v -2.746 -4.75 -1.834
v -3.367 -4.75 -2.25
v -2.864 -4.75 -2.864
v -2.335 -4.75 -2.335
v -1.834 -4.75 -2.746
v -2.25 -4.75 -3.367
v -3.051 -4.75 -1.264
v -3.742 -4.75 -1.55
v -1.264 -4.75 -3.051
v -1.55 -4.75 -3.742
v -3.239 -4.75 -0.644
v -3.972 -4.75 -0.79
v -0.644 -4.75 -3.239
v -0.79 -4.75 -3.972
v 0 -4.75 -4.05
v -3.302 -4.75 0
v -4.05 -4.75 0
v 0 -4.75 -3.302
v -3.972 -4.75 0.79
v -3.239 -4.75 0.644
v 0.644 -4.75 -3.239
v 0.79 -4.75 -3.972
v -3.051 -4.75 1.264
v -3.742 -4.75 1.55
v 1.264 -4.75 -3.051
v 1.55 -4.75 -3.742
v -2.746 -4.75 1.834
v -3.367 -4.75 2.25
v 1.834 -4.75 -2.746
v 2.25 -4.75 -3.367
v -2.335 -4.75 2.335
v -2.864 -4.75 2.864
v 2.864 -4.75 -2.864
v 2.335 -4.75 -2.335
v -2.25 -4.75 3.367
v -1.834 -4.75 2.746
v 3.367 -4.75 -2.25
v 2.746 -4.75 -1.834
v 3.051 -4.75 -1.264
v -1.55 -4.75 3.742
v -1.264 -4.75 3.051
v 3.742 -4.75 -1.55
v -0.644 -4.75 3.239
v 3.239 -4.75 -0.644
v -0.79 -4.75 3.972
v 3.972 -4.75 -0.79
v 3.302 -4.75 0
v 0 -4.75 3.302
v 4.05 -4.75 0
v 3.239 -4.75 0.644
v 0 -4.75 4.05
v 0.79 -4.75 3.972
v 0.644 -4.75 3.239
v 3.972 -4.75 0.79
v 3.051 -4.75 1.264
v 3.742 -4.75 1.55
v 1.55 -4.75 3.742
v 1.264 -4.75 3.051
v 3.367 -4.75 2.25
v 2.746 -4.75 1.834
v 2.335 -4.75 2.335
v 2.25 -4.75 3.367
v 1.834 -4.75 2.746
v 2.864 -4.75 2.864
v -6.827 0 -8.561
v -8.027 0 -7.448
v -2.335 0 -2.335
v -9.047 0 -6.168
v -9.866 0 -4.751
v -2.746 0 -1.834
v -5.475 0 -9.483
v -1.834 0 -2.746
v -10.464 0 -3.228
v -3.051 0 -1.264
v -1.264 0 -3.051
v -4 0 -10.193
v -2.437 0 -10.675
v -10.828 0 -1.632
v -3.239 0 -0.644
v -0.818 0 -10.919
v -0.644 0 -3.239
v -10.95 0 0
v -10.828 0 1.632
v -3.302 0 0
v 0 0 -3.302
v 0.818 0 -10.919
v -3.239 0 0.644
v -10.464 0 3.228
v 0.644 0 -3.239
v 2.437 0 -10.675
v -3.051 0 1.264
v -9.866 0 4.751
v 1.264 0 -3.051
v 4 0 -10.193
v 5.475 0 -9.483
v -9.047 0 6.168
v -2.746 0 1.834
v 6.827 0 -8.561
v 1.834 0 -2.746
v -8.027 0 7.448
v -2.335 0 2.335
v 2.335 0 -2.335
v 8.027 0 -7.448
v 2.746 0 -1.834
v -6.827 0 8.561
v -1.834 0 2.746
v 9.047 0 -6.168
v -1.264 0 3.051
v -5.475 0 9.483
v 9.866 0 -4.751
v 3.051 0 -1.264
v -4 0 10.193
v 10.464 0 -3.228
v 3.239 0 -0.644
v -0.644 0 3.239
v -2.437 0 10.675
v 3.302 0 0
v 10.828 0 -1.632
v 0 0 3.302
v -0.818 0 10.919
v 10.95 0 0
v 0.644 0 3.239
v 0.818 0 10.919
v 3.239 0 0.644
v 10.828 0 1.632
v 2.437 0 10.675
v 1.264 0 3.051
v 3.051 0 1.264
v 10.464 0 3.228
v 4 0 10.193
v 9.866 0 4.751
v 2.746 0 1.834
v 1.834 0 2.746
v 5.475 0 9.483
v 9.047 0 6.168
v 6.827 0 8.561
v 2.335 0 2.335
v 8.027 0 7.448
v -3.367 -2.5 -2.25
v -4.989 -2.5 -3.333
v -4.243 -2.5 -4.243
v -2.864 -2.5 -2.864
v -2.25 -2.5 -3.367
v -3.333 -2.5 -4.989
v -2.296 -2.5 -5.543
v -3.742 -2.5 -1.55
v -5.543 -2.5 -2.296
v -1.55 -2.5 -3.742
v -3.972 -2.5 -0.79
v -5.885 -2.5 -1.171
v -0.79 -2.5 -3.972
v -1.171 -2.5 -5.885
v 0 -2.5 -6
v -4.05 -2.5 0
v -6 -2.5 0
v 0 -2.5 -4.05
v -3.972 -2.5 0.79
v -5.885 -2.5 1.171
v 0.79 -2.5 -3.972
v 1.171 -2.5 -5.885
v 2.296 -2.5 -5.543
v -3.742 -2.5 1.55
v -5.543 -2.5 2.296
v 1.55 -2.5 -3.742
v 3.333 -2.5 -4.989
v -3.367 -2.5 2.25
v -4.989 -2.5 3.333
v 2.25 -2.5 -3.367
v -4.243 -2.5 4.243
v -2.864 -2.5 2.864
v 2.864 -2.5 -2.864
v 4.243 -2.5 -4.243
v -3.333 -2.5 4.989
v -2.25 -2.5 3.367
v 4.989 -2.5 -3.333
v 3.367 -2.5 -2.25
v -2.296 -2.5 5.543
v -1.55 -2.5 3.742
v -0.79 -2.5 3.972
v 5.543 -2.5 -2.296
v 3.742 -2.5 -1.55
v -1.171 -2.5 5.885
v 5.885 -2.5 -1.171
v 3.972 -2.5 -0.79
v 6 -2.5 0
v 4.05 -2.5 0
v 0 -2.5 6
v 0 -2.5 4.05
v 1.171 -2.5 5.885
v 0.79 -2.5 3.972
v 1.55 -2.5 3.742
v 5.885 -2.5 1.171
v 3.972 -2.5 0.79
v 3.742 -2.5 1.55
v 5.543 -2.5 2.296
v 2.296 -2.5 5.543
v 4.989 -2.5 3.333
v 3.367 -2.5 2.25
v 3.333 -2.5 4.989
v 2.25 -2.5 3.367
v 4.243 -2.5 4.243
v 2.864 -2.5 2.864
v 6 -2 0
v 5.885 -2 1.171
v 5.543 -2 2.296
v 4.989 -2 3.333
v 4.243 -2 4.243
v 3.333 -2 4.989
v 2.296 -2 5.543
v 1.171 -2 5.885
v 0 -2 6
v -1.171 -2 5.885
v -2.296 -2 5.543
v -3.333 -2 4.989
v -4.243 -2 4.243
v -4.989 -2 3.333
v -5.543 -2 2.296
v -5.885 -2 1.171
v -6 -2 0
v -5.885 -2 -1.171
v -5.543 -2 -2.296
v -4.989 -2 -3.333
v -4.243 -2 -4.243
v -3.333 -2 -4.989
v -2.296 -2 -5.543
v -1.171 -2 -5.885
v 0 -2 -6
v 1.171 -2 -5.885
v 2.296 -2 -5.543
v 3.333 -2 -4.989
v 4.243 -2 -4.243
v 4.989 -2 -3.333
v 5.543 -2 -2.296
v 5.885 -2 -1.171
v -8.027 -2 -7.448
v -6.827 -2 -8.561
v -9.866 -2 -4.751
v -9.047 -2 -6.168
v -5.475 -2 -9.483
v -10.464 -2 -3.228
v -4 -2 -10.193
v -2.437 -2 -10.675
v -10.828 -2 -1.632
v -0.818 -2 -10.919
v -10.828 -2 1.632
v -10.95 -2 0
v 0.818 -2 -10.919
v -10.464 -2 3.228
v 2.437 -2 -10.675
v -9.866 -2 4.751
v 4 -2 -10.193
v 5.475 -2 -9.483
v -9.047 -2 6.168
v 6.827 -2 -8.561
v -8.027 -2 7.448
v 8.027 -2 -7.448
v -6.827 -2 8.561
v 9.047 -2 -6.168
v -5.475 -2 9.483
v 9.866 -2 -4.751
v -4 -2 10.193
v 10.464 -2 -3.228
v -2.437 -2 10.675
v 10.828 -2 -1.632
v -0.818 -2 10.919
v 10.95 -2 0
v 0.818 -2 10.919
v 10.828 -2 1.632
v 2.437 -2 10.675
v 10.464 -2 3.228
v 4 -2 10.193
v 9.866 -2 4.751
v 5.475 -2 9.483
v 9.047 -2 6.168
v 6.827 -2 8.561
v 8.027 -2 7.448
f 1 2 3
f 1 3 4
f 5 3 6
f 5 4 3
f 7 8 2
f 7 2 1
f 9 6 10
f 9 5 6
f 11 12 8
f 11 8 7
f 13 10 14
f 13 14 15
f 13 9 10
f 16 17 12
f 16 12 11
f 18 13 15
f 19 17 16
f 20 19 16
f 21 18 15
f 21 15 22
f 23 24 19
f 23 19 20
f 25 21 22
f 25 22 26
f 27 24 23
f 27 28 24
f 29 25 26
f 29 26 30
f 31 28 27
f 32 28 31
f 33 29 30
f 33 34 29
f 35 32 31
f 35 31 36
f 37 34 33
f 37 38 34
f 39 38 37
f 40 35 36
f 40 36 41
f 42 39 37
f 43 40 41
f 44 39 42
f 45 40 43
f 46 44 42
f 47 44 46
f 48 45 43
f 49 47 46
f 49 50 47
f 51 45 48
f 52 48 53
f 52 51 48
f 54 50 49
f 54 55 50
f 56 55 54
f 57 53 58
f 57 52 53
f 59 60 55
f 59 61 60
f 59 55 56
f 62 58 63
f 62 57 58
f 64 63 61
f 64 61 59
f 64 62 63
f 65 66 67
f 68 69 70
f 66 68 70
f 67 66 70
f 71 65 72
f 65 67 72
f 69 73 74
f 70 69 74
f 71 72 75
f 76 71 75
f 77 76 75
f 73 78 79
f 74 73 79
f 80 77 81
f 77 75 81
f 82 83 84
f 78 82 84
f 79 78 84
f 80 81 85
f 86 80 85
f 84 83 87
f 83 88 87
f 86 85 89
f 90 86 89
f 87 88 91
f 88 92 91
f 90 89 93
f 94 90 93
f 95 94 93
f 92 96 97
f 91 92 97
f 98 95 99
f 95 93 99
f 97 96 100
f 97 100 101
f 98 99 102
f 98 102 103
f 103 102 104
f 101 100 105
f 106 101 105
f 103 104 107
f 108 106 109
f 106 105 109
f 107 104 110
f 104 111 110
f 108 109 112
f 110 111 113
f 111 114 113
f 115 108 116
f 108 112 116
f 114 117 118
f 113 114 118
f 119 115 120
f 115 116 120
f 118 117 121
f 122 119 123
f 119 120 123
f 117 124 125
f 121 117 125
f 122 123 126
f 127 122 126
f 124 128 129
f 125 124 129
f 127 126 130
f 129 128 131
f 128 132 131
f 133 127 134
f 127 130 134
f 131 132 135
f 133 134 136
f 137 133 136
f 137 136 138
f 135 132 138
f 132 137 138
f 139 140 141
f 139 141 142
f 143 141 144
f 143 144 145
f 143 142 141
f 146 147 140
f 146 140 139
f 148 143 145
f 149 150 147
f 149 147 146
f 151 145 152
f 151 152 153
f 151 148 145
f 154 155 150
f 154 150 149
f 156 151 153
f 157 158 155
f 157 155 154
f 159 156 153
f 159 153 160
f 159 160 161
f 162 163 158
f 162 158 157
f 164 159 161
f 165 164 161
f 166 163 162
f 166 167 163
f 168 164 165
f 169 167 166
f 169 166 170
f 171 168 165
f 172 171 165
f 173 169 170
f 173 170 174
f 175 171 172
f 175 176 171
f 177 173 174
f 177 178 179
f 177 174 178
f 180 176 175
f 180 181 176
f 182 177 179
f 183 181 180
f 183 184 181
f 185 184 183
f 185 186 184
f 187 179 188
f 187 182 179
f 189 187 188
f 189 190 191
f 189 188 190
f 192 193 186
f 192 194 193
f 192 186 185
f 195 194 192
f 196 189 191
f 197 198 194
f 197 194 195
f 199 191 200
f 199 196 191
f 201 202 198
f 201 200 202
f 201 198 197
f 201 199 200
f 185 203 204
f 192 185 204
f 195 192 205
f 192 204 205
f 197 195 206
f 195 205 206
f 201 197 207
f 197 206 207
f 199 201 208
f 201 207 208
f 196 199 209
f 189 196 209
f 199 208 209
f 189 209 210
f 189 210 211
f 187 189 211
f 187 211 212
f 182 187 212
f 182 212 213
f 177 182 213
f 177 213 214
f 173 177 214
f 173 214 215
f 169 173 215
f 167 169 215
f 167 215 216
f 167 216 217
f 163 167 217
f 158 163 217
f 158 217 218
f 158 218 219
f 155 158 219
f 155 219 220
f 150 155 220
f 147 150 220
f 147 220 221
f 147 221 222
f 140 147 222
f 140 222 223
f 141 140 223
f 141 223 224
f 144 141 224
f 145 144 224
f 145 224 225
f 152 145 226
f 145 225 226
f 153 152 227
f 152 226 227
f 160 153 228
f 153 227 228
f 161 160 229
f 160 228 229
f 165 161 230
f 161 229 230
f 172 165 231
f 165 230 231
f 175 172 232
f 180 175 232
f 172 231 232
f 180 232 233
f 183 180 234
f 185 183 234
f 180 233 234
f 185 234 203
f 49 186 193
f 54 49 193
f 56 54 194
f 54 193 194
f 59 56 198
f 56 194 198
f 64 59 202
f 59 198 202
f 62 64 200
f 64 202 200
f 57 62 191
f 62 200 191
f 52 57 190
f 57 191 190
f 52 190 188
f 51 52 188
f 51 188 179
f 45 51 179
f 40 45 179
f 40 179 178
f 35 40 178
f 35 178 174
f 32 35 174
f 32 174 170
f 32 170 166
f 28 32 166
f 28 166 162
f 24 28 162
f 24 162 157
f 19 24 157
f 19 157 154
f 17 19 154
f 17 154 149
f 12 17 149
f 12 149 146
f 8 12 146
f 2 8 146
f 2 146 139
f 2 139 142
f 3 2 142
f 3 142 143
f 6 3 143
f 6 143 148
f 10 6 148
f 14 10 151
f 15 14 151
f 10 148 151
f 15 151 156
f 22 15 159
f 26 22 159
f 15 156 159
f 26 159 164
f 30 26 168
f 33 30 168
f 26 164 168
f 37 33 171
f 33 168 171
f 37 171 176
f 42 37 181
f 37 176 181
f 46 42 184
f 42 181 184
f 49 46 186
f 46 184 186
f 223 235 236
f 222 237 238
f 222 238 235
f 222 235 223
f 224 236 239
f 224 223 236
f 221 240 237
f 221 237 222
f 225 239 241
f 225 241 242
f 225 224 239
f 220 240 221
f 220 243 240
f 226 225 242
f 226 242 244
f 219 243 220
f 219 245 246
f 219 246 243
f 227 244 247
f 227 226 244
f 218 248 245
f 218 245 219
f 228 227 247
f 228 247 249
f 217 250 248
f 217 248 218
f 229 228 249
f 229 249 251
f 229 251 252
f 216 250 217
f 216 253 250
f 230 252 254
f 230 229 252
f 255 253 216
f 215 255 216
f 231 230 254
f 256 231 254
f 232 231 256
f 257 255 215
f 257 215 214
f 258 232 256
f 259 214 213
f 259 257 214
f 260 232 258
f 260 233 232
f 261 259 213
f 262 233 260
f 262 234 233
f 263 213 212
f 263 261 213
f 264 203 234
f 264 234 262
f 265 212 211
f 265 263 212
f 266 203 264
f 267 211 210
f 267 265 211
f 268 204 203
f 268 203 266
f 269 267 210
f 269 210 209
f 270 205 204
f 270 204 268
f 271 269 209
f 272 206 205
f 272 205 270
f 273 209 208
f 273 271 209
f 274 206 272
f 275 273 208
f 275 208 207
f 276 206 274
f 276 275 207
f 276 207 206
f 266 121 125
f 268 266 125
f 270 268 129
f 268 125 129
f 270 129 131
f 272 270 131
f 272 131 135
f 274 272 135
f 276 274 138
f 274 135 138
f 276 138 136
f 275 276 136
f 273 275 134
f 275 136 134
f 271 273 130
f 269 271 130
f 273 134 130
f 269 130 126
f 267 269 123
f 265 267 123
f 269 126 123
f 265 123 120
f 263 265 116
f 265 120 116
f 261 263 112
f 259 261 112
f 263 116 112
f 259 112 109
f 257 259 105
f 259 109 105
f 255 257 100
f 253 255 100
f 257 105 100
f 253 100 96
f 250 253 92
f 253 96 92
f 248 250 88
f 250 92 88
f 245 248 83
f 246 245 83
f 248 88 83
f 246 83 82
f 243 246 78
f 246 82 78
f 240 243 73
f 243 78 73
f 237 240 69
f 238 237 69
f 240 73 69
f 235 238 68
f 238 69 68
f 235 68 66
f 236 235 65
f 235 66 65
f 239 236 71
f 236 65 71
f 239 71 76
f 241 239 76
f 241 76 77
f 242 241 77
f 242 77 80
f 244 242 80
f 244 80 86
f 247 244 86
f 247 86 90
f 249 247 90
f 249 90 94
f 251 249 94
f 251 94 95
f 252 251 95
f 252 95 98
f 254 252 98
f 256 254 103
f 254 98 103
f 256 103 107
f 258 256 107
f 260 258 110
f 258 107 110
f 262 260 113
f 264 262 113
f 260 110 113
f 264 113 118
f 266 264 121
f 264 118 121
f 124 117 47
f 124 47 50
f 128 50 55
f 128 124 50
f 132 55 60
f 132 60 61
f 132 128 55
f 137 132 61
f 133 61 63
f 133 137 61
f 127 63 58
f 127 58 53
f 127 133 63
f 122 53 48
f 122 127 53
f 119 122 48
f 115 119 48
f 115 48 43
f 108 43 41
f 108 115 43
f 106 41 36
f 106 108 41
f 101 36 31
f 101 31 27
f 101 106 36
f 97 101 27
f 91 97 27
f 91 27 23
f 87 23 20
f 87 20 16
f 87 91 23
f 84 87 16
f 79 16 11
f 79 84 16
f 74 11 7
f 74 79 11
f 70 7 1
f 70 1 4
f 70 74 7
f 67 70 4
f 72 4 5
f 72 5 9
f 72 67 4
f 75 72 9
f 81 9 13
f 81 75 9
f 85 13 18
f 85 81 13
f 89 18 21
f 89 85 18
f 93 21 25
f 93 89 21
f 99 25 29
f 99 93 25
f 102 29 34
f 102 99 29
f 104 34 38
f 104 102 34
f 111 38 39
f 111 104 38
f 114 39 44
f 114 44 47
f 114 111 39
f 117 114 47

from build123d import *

# Parameters (mm, degrees)
F0_R     = 10.95
F0_R_2   = 7.95
F1_DEPTH = 2
F0_R_3   = 6
F2_DEPTH = 2
F0_R_4   = 4.05
F3_DEPTH = 2.5
F0_R_5   = 3.302
F4_DEPTH = 4.75


with BuildPart() as f1:
    # F0 (on Front) → F1 (new body)
    with BuildSketch(Plane.XZ):
        Circle(F0_R)
        Circle(F0_R_2, mode=Mode.SUBTRACT)
    extrude(amount=F1_DEPTH)

    # F0 (on Front) → F2 (join)
    with BuildSketch(Plane.XZ):
        Circle(F0_R_2)
        Circle(F0_R_3, mode=Mode.SUBTRACT)
    extrude(amount=F2_DEPTH)

    # F0 (on Front) → F3 (join)
    with BuildSketch(Plane.XZ):
        Circle(F0_R_3)
        Circle(F0_R_4, mode=Mode.SUBTRACT)
    extrude(amount=F3_DEPTH)

    # F0 (on Front) → F4 (join)
    with BuildSketch(Plane.XZ):
        Circle(F0_R_4)
        Circle(F0_R_5, mode=Mode.SUBTRACT)
    extrude(amount=F4_DEPTH)


solid = f1.part
